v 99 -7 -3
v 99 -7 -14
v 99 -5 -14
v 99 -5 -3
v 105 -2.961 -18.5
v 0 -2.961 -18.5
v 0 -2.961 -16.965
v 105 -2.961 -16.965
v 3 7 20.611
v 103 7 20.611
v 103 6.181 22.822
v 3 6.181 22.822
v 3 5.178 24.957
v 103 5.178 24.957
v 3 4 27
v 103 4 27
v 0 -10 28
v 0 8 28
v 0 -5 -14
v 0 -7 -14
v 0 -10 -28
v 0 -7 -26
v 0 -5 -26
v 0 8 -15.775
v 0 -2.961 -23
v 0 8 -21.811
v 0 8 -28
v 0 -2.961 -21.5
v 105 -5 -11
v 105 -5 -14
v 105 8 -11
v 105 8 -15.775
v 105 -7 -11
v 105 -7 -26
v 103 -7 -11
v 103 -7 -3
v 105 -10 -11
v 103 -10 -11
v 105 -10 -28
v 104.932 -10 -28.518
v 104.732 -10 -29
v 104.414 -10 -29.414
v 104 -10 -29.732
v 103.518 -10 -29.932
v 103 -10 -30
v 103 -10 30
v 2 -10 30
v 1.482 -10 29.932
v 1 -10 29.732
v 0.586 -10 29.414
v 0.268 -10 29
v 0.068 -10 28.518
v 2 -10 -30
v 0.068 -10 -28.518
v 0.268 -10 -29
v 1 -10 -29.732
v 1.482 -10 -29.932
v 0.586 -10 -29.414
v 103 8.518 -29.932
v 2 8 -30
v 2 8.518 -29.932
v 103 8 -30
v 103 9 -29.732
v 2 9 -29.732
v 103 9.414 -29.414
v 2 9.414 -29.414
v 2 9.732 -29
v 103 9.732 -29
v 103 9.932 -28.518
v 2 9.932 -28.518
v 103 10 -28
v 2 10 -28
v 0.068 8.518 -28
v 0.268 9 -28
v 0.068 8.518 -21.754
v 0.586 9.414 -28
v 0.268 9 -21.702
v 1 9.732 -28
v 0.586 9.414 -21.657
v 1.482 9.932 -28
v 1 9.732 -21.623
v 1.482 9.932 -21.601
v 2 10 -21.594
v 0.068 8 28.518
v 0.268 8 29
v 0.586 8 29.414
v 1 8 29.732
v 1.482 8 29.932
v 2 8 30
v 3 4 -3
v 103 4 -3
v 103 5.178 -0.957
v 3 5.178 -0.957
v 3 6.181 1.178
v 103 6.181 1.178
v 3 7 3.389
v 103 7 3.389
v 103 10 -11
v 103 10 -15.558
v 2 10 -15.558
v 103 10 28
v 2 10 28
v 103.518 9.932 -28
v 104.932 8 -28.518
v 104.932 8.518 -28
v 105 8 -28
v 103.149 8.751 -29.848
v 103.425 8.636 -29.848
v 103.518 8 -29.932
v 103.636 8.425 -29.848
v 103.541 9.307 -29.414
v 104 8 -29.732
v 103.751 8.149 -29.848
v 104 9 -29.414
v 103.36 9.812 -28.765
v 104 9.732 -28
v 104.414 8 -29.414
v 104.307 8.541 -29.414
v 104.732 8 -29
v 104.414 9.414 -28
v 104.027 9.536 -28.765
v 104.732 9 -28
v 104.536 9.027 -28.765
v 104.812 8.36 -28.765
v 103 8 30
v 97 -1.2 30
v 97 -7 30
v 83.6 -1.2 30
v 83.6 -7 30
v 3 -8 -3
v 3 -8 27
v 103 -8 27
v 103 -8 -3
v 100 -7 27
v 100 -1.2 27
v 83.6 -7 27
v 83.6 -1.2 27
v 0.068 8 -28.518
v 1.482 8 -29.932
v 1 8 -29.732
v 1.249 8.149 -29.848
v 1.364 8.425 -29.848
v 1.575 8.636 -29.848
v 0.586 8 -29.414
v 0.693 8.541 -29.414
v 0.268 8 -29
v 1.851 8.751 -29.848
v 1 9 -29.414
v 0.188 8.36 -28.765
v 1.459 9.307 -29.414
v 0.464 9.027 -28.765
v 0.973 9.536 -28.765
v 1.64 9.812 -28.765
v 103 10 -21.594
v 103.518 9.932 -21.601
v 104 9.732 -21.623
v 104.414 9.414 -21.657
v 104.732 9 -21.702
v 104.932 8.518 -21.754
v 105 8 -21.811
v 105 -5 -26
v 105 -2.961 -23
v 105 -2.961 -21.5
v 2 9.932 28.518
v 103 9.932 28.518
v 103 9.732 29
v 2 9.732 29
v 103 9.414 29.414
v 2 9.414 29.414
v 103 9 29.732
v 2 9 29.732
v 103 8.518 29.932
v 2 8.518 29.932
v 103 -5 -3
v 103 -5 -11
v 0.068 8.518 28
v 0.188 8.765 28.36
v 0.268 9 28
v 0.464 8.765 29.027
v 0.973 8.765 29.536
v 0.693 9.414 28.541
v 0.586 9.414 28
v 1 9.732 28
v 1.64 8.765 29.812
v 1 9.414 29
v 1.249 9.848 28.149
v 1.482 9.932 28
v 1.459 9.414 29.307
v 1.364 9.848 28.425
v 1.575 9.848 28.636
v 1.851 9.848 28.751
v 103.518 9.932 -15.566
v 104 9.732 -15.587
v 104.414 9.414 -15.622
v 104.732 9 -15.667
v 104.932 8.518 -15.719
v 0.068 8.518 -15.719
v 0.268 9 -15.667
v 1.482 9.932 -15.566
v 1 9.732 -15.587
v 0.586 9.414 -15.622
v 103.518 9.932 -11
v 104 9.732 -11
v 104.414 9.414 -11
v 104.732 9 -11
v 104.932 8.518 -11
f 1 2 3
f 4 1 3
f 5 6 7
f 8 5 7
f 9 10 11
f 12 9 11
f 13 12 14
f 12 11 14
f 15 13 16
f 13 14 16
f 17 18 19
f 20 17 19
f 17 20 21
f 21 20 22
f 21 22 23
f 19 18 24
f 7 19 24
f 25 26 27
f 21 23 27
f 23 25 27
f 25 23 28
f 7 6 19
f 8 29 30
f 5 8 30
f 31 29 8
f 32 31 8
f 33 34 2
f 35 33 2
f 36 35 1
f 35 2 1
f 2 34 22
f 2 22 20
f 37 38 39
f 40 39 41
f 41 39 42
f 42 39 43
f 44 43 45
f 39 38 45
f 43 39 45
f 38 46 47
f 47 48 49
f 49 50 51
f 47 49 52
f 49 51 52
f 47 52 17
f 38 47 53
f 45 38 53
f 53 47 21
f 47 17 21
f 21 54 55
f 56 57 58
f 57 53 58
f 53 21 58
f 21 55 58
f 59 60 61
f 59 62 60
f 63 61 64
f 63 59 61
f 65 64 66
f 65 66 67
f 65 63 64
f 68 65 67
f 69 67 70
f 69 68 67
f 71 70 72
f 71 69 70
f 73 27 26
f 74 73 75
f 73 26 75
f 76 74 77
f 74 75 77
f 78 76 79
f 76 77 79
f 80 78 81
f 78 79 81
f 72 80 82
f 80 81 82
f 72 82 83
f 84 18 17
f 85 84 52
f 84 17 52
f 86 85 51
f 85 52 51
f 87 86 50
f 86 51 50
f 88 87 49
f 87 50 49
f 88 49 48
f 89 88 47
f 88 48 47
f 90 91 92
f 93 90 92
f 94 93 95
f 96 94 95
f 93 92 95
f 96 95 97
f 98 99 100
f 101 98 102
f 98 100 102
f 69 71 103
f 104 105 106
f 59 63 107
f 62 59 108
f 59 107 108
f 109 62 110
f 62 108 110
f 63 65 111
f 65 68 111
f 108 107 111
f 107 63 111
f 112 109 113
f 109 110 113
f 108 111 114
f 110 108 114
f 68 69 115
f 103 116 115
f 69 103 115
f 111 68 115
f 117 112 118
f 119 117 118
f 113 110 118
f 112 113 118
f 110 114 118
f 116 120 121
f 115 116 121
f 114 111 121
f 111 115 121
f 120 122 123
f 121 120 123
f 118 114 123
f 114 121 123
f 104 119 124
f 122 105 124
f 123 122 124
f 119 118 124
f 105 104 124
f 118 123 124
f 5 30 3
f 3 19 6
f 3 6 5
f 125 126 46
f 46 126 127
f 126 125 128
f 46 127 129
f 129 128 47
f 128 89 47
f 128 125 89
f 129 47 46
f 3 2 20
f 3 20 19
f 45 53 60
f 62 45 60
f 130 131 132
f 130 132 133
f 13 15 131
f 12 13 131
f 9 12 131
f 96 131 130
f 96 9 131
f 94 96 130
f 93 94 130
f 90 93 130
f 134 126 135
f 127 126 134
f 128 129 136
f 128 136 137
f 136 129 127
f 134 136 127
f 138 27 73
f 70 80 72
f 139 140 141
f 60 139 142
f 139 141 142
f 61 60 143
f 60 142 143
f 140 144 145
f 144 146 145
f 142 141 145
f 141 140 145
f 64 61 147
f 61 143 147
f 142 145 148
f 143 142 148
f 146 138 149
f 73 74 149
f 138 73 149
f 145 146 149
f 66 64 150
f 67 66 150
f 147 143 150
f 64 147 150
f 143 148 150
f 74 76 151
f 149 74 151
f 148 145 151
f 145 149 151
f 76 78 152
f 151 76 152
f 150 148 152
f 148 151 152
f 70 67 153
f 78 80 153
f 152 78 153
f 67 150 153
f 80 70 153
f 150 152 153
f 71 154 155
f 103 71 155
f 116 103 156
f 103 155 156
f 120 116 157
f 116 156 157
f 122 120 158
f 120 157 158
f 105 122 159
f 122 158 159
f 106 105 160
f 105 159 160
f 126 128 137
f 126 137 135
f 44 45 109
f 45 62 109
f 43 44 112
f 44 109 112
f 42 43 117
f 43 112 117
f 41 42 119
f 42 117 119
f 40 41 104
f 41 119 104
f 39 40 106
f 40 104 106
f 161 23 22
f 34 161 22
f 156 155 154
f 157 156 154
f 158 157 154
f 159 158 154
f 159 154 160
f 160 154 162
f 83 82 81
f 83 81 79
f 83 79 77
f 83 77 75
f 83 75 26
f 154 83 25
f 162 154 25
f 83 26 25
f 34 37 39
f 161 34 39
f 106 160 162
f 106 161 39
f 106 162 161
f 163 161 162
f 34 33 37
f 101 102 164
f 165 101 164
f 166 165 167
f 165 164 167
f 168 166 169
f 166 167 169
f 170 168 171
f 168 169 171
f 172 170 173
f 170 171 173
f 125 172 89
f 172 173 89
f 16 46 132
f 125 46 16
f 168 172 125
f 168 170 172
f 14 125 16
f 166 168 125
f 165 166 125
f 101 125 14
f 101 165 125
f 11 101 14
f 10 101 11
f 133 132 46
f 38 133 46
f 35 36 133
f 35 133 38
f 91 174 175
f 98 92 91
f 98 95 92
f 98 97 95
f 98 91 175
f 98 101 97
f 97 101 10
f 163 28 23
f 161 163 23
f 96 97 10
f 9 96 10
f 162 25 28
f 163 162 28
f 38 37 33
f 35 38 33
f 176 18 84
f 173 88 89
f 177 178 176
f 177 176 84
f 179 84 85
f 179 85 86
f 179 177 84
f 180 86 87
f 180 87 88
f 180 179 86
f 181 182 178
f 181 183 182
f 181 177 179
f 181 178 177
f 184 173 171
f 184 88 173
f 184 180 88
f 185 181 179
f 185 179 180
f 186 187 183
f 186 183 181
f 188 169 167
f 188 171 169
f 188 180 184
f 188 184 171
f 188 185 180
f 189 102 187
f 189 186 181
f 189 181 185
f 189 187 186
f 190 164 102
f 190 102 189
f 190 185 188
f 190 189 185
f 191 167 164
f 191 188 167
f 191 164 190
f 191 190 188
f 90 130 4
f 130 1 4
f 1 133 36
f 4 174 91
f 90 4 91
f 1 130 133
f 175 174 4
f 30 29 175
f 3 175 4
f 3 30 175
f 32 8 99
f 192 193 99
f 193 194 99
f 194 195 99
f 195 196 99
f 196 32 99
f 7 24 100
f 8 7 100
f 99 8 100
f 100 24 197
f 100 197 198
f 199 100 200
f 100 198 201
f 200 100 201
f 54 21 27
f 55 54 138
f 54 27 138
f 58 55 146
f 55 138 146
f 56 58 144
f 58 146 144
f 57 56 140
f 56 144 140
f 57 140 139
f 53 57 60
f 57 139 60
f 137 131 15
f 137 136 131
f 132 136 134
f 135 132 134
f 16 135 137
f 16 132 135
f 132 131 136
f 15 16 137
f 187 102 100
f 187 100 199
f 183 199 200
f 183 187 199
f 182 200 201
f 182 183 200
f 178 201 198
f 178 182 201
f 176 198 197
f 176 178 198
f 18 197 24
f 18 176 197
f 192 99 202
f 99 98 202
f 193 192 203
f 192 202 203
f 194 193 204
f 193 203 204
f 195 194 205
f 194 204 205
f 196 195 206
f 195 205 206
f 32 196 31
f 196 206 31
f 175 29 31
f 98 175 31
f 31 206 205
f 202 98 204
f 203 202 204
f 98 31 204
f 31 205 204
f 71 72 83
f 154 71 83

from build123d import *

# Parameters (mm, degrees)
P_IDAT_VYSUNUT_M2_DEPTH  = 105
SKICA3_W                 = 30
SKICA3_H                 = 12
ODEBRAT_VYSUNUT_M1_DEPTH = 102
SKICA5_W                 = 6
SKICA5_H                 = 2
ODEBRAT_VYSUNUT_M3_DEPTH = 15
ODEBRAT_VYSUNUT_M6_DEPTH = 102
SKICA12_W                = 41
SKICA12_H                = 20
ODEBRAT_VYSUNUT_M8_DEPTH = 2
SKICA13_W                = 13.4
SKICA13_H                = 5.8
ODEBRAT_VYSUNUT_M9_DEPTH = 10
ZAOBLIT1_R               = 2
ZAOBLIT2_R               = 2
ZKOSEN_2_SIZE            = 3


# Some blends are built 0.0001 mm under size
with BuildPart() as part:
    # Skica2 → Přidat vysunutím2 (new body)
    with BuildSketch(Plane(origin=(0, 0, 0), x_dir=(0, 0, -1), z_dir=(1, 0, 0))):
        Polygon((15.558367755, 10), (-30, 10), (-30, -10), (30, -10), (30, 10), (21.59358807, 10), (23, -2.961048892), (21.5, -2.961048892), (26, -5), (26, -7), (14, -7), (14, -5), (18.5, -2.961048892), (16.964779685, -2.961048892), align=None)
    extrude(amount=P_IDAT_VYSUNUT_M2_DEPTH)

    # Skica3 → Odebrat vysunutím1 (cut)
    with BuildSketch(Plane(origin=(105, 0, 0), x_dir=(0, 0, -1), z_dir=(1, 0, 0))):
        with Locations((-12, -2)):
            Rectangle(SKICA3_W, SKICA3_H)
    extrude(amount=-ODEBRAT_VYSUNUT_M1_DEPTH, mode=Mode.SUBTRACT)

    # Skica5 → Odebrat vysunutím3 (cut)
    with BuildSketch(Plane(origin=(0, 0, -14), x_dir=(-1, 0, 0), z_dir=(0, 0, -1))):
        with Locations((-102, -6)):
            Rectangle(SKICA5_W, SKICA5_H)
    extrude(amount=-ODEBRAT_VYSUNUT_M3_DEPTH, mode=Mode.SUBTRACT)

    # Skica10 → Odebrat vysunutím6 (cut)
    with BuildSketch(Plane(origin=(105, 0, 0), x_dir=(0, 0, -1), z_dir=(1, 0, 0))):
        with BuildLine():
            ThreePointArc((-20.610511889, 7), (-23.90017092, 5.702152702), (-27, 4))
            Line((-27, 4), (3, 4))
            ThreePointArc((3, 4), (-0.09982908, 5.702152702), (-3.389488111, 7))
            Line((-3.389488111, 7), (-20.610511889, 7))
        make_face()
    extrude(amount=-ODEBRAT_VYSUNUT_M6_DEPTH, mode=Mode.SUBTRACT)

    # Skica12 → Odebrat vysunutím8 (cut)
    with BuildSketch(Plane(origin=(105, 0, 0), x_dir=(0, 0, -1), z_dir=(1, 0, 0))):
        with Locations((-9.5, 0)):
            Rectangle(SKICA12_W, SKICA12_H)
    extrude(amount=-ODEBRAT_VYSUNUT_M8_DEPTH, mode=Mode.SUBTRACT)

    # Skica13 → Odebrat vysunutím9 (cut)
    with BuildSketch(Plane.XY.offset(30)):
        with Locations((90.3, -4.1)):
            Rectangle(SKICA13_W, SKICA13_H)
    extrude(amount=-ODEBRAT_VYSUNUT_M9_DEPTH, mode=Mode.SUBTRACT)

    # Zaoblit1
    zaoblit1_edges = [part.edges().sort_by_distance(p)[0] for p in [
        (0, 0, 30),
        (0, 10, 7.220816123),
        (105, 10, -13.279183877),
        (105, 10, -25.796794035),
        (0, 10, -25.796794035),
        (0, 0, -30),
        (52.5, 10, -30),
        (105, 0, -30),
    ]]
    fillet(zaoblit1_edges, radius=ZAOBLIT1_R)

    # Zaoblit2
    # the kernel refuses this fillet: 2 mm, written as the material it takes off along each edge
    with BuildSketch(Plane(origin=(2, 8, 28), x_dir=(0, 0, 1), z_dir=(0, 1, 0))) as zaoblit2_piece_1_section:
        Polygon((0, 0), (ZAOBLIT2_R, 0), (ZAOBLIT2_R, -ZAOBLIT2_R), (0, -ZAOBLIT2_R), align=None)
    zaoblit2_piece_1 = extrude(amount=ZAOBLIT2_R, mode=Mode.PRIVATE)
    zaoblit2_piece_1 = zaoblit2_piece_1 - Plane(origin=(2, 8, 28), x_dir=(0.7071067811865475, 0, -0.7071067811865475), z_dir=(0, 1, 0)) * Sphere(ZAOBLIT2_R, mode=Mode.PRIVATE)
    add(zaoblit2_piece_1, mode=Mode.SUBTRACT)
    with BuildSketch(Plane(origin=(2, 10, 30), x_dir=(0, 0, -1), z_dir=(1, 0, 0))) as zaoblit2_piece_2:
        with BuildLine():
            CenterArc((ZAOBLIT2_R, -ZAOBLIT2_R), ZAOBLIT2_R, 90, 90)
            Line((0, -ZAOBLIT2_R), (0, 0))
            Line((0, 0), (ZAOBLIT2_R, 0))
        make_face()
    extrude(amount=106, mode=Mode.SUBTRACT)

    # Zkosení2
    zkosen_2_edges = [part.edges().sort_by_distance(p)[0] for p in [
        (97, -4.1, 27),
    ]]
    chamfer(zkosen_2_edges, length=ZKOSEN_2_SIZE - 0.0001)  # a hair under: the kernel refuses the full size


solid = part.part
